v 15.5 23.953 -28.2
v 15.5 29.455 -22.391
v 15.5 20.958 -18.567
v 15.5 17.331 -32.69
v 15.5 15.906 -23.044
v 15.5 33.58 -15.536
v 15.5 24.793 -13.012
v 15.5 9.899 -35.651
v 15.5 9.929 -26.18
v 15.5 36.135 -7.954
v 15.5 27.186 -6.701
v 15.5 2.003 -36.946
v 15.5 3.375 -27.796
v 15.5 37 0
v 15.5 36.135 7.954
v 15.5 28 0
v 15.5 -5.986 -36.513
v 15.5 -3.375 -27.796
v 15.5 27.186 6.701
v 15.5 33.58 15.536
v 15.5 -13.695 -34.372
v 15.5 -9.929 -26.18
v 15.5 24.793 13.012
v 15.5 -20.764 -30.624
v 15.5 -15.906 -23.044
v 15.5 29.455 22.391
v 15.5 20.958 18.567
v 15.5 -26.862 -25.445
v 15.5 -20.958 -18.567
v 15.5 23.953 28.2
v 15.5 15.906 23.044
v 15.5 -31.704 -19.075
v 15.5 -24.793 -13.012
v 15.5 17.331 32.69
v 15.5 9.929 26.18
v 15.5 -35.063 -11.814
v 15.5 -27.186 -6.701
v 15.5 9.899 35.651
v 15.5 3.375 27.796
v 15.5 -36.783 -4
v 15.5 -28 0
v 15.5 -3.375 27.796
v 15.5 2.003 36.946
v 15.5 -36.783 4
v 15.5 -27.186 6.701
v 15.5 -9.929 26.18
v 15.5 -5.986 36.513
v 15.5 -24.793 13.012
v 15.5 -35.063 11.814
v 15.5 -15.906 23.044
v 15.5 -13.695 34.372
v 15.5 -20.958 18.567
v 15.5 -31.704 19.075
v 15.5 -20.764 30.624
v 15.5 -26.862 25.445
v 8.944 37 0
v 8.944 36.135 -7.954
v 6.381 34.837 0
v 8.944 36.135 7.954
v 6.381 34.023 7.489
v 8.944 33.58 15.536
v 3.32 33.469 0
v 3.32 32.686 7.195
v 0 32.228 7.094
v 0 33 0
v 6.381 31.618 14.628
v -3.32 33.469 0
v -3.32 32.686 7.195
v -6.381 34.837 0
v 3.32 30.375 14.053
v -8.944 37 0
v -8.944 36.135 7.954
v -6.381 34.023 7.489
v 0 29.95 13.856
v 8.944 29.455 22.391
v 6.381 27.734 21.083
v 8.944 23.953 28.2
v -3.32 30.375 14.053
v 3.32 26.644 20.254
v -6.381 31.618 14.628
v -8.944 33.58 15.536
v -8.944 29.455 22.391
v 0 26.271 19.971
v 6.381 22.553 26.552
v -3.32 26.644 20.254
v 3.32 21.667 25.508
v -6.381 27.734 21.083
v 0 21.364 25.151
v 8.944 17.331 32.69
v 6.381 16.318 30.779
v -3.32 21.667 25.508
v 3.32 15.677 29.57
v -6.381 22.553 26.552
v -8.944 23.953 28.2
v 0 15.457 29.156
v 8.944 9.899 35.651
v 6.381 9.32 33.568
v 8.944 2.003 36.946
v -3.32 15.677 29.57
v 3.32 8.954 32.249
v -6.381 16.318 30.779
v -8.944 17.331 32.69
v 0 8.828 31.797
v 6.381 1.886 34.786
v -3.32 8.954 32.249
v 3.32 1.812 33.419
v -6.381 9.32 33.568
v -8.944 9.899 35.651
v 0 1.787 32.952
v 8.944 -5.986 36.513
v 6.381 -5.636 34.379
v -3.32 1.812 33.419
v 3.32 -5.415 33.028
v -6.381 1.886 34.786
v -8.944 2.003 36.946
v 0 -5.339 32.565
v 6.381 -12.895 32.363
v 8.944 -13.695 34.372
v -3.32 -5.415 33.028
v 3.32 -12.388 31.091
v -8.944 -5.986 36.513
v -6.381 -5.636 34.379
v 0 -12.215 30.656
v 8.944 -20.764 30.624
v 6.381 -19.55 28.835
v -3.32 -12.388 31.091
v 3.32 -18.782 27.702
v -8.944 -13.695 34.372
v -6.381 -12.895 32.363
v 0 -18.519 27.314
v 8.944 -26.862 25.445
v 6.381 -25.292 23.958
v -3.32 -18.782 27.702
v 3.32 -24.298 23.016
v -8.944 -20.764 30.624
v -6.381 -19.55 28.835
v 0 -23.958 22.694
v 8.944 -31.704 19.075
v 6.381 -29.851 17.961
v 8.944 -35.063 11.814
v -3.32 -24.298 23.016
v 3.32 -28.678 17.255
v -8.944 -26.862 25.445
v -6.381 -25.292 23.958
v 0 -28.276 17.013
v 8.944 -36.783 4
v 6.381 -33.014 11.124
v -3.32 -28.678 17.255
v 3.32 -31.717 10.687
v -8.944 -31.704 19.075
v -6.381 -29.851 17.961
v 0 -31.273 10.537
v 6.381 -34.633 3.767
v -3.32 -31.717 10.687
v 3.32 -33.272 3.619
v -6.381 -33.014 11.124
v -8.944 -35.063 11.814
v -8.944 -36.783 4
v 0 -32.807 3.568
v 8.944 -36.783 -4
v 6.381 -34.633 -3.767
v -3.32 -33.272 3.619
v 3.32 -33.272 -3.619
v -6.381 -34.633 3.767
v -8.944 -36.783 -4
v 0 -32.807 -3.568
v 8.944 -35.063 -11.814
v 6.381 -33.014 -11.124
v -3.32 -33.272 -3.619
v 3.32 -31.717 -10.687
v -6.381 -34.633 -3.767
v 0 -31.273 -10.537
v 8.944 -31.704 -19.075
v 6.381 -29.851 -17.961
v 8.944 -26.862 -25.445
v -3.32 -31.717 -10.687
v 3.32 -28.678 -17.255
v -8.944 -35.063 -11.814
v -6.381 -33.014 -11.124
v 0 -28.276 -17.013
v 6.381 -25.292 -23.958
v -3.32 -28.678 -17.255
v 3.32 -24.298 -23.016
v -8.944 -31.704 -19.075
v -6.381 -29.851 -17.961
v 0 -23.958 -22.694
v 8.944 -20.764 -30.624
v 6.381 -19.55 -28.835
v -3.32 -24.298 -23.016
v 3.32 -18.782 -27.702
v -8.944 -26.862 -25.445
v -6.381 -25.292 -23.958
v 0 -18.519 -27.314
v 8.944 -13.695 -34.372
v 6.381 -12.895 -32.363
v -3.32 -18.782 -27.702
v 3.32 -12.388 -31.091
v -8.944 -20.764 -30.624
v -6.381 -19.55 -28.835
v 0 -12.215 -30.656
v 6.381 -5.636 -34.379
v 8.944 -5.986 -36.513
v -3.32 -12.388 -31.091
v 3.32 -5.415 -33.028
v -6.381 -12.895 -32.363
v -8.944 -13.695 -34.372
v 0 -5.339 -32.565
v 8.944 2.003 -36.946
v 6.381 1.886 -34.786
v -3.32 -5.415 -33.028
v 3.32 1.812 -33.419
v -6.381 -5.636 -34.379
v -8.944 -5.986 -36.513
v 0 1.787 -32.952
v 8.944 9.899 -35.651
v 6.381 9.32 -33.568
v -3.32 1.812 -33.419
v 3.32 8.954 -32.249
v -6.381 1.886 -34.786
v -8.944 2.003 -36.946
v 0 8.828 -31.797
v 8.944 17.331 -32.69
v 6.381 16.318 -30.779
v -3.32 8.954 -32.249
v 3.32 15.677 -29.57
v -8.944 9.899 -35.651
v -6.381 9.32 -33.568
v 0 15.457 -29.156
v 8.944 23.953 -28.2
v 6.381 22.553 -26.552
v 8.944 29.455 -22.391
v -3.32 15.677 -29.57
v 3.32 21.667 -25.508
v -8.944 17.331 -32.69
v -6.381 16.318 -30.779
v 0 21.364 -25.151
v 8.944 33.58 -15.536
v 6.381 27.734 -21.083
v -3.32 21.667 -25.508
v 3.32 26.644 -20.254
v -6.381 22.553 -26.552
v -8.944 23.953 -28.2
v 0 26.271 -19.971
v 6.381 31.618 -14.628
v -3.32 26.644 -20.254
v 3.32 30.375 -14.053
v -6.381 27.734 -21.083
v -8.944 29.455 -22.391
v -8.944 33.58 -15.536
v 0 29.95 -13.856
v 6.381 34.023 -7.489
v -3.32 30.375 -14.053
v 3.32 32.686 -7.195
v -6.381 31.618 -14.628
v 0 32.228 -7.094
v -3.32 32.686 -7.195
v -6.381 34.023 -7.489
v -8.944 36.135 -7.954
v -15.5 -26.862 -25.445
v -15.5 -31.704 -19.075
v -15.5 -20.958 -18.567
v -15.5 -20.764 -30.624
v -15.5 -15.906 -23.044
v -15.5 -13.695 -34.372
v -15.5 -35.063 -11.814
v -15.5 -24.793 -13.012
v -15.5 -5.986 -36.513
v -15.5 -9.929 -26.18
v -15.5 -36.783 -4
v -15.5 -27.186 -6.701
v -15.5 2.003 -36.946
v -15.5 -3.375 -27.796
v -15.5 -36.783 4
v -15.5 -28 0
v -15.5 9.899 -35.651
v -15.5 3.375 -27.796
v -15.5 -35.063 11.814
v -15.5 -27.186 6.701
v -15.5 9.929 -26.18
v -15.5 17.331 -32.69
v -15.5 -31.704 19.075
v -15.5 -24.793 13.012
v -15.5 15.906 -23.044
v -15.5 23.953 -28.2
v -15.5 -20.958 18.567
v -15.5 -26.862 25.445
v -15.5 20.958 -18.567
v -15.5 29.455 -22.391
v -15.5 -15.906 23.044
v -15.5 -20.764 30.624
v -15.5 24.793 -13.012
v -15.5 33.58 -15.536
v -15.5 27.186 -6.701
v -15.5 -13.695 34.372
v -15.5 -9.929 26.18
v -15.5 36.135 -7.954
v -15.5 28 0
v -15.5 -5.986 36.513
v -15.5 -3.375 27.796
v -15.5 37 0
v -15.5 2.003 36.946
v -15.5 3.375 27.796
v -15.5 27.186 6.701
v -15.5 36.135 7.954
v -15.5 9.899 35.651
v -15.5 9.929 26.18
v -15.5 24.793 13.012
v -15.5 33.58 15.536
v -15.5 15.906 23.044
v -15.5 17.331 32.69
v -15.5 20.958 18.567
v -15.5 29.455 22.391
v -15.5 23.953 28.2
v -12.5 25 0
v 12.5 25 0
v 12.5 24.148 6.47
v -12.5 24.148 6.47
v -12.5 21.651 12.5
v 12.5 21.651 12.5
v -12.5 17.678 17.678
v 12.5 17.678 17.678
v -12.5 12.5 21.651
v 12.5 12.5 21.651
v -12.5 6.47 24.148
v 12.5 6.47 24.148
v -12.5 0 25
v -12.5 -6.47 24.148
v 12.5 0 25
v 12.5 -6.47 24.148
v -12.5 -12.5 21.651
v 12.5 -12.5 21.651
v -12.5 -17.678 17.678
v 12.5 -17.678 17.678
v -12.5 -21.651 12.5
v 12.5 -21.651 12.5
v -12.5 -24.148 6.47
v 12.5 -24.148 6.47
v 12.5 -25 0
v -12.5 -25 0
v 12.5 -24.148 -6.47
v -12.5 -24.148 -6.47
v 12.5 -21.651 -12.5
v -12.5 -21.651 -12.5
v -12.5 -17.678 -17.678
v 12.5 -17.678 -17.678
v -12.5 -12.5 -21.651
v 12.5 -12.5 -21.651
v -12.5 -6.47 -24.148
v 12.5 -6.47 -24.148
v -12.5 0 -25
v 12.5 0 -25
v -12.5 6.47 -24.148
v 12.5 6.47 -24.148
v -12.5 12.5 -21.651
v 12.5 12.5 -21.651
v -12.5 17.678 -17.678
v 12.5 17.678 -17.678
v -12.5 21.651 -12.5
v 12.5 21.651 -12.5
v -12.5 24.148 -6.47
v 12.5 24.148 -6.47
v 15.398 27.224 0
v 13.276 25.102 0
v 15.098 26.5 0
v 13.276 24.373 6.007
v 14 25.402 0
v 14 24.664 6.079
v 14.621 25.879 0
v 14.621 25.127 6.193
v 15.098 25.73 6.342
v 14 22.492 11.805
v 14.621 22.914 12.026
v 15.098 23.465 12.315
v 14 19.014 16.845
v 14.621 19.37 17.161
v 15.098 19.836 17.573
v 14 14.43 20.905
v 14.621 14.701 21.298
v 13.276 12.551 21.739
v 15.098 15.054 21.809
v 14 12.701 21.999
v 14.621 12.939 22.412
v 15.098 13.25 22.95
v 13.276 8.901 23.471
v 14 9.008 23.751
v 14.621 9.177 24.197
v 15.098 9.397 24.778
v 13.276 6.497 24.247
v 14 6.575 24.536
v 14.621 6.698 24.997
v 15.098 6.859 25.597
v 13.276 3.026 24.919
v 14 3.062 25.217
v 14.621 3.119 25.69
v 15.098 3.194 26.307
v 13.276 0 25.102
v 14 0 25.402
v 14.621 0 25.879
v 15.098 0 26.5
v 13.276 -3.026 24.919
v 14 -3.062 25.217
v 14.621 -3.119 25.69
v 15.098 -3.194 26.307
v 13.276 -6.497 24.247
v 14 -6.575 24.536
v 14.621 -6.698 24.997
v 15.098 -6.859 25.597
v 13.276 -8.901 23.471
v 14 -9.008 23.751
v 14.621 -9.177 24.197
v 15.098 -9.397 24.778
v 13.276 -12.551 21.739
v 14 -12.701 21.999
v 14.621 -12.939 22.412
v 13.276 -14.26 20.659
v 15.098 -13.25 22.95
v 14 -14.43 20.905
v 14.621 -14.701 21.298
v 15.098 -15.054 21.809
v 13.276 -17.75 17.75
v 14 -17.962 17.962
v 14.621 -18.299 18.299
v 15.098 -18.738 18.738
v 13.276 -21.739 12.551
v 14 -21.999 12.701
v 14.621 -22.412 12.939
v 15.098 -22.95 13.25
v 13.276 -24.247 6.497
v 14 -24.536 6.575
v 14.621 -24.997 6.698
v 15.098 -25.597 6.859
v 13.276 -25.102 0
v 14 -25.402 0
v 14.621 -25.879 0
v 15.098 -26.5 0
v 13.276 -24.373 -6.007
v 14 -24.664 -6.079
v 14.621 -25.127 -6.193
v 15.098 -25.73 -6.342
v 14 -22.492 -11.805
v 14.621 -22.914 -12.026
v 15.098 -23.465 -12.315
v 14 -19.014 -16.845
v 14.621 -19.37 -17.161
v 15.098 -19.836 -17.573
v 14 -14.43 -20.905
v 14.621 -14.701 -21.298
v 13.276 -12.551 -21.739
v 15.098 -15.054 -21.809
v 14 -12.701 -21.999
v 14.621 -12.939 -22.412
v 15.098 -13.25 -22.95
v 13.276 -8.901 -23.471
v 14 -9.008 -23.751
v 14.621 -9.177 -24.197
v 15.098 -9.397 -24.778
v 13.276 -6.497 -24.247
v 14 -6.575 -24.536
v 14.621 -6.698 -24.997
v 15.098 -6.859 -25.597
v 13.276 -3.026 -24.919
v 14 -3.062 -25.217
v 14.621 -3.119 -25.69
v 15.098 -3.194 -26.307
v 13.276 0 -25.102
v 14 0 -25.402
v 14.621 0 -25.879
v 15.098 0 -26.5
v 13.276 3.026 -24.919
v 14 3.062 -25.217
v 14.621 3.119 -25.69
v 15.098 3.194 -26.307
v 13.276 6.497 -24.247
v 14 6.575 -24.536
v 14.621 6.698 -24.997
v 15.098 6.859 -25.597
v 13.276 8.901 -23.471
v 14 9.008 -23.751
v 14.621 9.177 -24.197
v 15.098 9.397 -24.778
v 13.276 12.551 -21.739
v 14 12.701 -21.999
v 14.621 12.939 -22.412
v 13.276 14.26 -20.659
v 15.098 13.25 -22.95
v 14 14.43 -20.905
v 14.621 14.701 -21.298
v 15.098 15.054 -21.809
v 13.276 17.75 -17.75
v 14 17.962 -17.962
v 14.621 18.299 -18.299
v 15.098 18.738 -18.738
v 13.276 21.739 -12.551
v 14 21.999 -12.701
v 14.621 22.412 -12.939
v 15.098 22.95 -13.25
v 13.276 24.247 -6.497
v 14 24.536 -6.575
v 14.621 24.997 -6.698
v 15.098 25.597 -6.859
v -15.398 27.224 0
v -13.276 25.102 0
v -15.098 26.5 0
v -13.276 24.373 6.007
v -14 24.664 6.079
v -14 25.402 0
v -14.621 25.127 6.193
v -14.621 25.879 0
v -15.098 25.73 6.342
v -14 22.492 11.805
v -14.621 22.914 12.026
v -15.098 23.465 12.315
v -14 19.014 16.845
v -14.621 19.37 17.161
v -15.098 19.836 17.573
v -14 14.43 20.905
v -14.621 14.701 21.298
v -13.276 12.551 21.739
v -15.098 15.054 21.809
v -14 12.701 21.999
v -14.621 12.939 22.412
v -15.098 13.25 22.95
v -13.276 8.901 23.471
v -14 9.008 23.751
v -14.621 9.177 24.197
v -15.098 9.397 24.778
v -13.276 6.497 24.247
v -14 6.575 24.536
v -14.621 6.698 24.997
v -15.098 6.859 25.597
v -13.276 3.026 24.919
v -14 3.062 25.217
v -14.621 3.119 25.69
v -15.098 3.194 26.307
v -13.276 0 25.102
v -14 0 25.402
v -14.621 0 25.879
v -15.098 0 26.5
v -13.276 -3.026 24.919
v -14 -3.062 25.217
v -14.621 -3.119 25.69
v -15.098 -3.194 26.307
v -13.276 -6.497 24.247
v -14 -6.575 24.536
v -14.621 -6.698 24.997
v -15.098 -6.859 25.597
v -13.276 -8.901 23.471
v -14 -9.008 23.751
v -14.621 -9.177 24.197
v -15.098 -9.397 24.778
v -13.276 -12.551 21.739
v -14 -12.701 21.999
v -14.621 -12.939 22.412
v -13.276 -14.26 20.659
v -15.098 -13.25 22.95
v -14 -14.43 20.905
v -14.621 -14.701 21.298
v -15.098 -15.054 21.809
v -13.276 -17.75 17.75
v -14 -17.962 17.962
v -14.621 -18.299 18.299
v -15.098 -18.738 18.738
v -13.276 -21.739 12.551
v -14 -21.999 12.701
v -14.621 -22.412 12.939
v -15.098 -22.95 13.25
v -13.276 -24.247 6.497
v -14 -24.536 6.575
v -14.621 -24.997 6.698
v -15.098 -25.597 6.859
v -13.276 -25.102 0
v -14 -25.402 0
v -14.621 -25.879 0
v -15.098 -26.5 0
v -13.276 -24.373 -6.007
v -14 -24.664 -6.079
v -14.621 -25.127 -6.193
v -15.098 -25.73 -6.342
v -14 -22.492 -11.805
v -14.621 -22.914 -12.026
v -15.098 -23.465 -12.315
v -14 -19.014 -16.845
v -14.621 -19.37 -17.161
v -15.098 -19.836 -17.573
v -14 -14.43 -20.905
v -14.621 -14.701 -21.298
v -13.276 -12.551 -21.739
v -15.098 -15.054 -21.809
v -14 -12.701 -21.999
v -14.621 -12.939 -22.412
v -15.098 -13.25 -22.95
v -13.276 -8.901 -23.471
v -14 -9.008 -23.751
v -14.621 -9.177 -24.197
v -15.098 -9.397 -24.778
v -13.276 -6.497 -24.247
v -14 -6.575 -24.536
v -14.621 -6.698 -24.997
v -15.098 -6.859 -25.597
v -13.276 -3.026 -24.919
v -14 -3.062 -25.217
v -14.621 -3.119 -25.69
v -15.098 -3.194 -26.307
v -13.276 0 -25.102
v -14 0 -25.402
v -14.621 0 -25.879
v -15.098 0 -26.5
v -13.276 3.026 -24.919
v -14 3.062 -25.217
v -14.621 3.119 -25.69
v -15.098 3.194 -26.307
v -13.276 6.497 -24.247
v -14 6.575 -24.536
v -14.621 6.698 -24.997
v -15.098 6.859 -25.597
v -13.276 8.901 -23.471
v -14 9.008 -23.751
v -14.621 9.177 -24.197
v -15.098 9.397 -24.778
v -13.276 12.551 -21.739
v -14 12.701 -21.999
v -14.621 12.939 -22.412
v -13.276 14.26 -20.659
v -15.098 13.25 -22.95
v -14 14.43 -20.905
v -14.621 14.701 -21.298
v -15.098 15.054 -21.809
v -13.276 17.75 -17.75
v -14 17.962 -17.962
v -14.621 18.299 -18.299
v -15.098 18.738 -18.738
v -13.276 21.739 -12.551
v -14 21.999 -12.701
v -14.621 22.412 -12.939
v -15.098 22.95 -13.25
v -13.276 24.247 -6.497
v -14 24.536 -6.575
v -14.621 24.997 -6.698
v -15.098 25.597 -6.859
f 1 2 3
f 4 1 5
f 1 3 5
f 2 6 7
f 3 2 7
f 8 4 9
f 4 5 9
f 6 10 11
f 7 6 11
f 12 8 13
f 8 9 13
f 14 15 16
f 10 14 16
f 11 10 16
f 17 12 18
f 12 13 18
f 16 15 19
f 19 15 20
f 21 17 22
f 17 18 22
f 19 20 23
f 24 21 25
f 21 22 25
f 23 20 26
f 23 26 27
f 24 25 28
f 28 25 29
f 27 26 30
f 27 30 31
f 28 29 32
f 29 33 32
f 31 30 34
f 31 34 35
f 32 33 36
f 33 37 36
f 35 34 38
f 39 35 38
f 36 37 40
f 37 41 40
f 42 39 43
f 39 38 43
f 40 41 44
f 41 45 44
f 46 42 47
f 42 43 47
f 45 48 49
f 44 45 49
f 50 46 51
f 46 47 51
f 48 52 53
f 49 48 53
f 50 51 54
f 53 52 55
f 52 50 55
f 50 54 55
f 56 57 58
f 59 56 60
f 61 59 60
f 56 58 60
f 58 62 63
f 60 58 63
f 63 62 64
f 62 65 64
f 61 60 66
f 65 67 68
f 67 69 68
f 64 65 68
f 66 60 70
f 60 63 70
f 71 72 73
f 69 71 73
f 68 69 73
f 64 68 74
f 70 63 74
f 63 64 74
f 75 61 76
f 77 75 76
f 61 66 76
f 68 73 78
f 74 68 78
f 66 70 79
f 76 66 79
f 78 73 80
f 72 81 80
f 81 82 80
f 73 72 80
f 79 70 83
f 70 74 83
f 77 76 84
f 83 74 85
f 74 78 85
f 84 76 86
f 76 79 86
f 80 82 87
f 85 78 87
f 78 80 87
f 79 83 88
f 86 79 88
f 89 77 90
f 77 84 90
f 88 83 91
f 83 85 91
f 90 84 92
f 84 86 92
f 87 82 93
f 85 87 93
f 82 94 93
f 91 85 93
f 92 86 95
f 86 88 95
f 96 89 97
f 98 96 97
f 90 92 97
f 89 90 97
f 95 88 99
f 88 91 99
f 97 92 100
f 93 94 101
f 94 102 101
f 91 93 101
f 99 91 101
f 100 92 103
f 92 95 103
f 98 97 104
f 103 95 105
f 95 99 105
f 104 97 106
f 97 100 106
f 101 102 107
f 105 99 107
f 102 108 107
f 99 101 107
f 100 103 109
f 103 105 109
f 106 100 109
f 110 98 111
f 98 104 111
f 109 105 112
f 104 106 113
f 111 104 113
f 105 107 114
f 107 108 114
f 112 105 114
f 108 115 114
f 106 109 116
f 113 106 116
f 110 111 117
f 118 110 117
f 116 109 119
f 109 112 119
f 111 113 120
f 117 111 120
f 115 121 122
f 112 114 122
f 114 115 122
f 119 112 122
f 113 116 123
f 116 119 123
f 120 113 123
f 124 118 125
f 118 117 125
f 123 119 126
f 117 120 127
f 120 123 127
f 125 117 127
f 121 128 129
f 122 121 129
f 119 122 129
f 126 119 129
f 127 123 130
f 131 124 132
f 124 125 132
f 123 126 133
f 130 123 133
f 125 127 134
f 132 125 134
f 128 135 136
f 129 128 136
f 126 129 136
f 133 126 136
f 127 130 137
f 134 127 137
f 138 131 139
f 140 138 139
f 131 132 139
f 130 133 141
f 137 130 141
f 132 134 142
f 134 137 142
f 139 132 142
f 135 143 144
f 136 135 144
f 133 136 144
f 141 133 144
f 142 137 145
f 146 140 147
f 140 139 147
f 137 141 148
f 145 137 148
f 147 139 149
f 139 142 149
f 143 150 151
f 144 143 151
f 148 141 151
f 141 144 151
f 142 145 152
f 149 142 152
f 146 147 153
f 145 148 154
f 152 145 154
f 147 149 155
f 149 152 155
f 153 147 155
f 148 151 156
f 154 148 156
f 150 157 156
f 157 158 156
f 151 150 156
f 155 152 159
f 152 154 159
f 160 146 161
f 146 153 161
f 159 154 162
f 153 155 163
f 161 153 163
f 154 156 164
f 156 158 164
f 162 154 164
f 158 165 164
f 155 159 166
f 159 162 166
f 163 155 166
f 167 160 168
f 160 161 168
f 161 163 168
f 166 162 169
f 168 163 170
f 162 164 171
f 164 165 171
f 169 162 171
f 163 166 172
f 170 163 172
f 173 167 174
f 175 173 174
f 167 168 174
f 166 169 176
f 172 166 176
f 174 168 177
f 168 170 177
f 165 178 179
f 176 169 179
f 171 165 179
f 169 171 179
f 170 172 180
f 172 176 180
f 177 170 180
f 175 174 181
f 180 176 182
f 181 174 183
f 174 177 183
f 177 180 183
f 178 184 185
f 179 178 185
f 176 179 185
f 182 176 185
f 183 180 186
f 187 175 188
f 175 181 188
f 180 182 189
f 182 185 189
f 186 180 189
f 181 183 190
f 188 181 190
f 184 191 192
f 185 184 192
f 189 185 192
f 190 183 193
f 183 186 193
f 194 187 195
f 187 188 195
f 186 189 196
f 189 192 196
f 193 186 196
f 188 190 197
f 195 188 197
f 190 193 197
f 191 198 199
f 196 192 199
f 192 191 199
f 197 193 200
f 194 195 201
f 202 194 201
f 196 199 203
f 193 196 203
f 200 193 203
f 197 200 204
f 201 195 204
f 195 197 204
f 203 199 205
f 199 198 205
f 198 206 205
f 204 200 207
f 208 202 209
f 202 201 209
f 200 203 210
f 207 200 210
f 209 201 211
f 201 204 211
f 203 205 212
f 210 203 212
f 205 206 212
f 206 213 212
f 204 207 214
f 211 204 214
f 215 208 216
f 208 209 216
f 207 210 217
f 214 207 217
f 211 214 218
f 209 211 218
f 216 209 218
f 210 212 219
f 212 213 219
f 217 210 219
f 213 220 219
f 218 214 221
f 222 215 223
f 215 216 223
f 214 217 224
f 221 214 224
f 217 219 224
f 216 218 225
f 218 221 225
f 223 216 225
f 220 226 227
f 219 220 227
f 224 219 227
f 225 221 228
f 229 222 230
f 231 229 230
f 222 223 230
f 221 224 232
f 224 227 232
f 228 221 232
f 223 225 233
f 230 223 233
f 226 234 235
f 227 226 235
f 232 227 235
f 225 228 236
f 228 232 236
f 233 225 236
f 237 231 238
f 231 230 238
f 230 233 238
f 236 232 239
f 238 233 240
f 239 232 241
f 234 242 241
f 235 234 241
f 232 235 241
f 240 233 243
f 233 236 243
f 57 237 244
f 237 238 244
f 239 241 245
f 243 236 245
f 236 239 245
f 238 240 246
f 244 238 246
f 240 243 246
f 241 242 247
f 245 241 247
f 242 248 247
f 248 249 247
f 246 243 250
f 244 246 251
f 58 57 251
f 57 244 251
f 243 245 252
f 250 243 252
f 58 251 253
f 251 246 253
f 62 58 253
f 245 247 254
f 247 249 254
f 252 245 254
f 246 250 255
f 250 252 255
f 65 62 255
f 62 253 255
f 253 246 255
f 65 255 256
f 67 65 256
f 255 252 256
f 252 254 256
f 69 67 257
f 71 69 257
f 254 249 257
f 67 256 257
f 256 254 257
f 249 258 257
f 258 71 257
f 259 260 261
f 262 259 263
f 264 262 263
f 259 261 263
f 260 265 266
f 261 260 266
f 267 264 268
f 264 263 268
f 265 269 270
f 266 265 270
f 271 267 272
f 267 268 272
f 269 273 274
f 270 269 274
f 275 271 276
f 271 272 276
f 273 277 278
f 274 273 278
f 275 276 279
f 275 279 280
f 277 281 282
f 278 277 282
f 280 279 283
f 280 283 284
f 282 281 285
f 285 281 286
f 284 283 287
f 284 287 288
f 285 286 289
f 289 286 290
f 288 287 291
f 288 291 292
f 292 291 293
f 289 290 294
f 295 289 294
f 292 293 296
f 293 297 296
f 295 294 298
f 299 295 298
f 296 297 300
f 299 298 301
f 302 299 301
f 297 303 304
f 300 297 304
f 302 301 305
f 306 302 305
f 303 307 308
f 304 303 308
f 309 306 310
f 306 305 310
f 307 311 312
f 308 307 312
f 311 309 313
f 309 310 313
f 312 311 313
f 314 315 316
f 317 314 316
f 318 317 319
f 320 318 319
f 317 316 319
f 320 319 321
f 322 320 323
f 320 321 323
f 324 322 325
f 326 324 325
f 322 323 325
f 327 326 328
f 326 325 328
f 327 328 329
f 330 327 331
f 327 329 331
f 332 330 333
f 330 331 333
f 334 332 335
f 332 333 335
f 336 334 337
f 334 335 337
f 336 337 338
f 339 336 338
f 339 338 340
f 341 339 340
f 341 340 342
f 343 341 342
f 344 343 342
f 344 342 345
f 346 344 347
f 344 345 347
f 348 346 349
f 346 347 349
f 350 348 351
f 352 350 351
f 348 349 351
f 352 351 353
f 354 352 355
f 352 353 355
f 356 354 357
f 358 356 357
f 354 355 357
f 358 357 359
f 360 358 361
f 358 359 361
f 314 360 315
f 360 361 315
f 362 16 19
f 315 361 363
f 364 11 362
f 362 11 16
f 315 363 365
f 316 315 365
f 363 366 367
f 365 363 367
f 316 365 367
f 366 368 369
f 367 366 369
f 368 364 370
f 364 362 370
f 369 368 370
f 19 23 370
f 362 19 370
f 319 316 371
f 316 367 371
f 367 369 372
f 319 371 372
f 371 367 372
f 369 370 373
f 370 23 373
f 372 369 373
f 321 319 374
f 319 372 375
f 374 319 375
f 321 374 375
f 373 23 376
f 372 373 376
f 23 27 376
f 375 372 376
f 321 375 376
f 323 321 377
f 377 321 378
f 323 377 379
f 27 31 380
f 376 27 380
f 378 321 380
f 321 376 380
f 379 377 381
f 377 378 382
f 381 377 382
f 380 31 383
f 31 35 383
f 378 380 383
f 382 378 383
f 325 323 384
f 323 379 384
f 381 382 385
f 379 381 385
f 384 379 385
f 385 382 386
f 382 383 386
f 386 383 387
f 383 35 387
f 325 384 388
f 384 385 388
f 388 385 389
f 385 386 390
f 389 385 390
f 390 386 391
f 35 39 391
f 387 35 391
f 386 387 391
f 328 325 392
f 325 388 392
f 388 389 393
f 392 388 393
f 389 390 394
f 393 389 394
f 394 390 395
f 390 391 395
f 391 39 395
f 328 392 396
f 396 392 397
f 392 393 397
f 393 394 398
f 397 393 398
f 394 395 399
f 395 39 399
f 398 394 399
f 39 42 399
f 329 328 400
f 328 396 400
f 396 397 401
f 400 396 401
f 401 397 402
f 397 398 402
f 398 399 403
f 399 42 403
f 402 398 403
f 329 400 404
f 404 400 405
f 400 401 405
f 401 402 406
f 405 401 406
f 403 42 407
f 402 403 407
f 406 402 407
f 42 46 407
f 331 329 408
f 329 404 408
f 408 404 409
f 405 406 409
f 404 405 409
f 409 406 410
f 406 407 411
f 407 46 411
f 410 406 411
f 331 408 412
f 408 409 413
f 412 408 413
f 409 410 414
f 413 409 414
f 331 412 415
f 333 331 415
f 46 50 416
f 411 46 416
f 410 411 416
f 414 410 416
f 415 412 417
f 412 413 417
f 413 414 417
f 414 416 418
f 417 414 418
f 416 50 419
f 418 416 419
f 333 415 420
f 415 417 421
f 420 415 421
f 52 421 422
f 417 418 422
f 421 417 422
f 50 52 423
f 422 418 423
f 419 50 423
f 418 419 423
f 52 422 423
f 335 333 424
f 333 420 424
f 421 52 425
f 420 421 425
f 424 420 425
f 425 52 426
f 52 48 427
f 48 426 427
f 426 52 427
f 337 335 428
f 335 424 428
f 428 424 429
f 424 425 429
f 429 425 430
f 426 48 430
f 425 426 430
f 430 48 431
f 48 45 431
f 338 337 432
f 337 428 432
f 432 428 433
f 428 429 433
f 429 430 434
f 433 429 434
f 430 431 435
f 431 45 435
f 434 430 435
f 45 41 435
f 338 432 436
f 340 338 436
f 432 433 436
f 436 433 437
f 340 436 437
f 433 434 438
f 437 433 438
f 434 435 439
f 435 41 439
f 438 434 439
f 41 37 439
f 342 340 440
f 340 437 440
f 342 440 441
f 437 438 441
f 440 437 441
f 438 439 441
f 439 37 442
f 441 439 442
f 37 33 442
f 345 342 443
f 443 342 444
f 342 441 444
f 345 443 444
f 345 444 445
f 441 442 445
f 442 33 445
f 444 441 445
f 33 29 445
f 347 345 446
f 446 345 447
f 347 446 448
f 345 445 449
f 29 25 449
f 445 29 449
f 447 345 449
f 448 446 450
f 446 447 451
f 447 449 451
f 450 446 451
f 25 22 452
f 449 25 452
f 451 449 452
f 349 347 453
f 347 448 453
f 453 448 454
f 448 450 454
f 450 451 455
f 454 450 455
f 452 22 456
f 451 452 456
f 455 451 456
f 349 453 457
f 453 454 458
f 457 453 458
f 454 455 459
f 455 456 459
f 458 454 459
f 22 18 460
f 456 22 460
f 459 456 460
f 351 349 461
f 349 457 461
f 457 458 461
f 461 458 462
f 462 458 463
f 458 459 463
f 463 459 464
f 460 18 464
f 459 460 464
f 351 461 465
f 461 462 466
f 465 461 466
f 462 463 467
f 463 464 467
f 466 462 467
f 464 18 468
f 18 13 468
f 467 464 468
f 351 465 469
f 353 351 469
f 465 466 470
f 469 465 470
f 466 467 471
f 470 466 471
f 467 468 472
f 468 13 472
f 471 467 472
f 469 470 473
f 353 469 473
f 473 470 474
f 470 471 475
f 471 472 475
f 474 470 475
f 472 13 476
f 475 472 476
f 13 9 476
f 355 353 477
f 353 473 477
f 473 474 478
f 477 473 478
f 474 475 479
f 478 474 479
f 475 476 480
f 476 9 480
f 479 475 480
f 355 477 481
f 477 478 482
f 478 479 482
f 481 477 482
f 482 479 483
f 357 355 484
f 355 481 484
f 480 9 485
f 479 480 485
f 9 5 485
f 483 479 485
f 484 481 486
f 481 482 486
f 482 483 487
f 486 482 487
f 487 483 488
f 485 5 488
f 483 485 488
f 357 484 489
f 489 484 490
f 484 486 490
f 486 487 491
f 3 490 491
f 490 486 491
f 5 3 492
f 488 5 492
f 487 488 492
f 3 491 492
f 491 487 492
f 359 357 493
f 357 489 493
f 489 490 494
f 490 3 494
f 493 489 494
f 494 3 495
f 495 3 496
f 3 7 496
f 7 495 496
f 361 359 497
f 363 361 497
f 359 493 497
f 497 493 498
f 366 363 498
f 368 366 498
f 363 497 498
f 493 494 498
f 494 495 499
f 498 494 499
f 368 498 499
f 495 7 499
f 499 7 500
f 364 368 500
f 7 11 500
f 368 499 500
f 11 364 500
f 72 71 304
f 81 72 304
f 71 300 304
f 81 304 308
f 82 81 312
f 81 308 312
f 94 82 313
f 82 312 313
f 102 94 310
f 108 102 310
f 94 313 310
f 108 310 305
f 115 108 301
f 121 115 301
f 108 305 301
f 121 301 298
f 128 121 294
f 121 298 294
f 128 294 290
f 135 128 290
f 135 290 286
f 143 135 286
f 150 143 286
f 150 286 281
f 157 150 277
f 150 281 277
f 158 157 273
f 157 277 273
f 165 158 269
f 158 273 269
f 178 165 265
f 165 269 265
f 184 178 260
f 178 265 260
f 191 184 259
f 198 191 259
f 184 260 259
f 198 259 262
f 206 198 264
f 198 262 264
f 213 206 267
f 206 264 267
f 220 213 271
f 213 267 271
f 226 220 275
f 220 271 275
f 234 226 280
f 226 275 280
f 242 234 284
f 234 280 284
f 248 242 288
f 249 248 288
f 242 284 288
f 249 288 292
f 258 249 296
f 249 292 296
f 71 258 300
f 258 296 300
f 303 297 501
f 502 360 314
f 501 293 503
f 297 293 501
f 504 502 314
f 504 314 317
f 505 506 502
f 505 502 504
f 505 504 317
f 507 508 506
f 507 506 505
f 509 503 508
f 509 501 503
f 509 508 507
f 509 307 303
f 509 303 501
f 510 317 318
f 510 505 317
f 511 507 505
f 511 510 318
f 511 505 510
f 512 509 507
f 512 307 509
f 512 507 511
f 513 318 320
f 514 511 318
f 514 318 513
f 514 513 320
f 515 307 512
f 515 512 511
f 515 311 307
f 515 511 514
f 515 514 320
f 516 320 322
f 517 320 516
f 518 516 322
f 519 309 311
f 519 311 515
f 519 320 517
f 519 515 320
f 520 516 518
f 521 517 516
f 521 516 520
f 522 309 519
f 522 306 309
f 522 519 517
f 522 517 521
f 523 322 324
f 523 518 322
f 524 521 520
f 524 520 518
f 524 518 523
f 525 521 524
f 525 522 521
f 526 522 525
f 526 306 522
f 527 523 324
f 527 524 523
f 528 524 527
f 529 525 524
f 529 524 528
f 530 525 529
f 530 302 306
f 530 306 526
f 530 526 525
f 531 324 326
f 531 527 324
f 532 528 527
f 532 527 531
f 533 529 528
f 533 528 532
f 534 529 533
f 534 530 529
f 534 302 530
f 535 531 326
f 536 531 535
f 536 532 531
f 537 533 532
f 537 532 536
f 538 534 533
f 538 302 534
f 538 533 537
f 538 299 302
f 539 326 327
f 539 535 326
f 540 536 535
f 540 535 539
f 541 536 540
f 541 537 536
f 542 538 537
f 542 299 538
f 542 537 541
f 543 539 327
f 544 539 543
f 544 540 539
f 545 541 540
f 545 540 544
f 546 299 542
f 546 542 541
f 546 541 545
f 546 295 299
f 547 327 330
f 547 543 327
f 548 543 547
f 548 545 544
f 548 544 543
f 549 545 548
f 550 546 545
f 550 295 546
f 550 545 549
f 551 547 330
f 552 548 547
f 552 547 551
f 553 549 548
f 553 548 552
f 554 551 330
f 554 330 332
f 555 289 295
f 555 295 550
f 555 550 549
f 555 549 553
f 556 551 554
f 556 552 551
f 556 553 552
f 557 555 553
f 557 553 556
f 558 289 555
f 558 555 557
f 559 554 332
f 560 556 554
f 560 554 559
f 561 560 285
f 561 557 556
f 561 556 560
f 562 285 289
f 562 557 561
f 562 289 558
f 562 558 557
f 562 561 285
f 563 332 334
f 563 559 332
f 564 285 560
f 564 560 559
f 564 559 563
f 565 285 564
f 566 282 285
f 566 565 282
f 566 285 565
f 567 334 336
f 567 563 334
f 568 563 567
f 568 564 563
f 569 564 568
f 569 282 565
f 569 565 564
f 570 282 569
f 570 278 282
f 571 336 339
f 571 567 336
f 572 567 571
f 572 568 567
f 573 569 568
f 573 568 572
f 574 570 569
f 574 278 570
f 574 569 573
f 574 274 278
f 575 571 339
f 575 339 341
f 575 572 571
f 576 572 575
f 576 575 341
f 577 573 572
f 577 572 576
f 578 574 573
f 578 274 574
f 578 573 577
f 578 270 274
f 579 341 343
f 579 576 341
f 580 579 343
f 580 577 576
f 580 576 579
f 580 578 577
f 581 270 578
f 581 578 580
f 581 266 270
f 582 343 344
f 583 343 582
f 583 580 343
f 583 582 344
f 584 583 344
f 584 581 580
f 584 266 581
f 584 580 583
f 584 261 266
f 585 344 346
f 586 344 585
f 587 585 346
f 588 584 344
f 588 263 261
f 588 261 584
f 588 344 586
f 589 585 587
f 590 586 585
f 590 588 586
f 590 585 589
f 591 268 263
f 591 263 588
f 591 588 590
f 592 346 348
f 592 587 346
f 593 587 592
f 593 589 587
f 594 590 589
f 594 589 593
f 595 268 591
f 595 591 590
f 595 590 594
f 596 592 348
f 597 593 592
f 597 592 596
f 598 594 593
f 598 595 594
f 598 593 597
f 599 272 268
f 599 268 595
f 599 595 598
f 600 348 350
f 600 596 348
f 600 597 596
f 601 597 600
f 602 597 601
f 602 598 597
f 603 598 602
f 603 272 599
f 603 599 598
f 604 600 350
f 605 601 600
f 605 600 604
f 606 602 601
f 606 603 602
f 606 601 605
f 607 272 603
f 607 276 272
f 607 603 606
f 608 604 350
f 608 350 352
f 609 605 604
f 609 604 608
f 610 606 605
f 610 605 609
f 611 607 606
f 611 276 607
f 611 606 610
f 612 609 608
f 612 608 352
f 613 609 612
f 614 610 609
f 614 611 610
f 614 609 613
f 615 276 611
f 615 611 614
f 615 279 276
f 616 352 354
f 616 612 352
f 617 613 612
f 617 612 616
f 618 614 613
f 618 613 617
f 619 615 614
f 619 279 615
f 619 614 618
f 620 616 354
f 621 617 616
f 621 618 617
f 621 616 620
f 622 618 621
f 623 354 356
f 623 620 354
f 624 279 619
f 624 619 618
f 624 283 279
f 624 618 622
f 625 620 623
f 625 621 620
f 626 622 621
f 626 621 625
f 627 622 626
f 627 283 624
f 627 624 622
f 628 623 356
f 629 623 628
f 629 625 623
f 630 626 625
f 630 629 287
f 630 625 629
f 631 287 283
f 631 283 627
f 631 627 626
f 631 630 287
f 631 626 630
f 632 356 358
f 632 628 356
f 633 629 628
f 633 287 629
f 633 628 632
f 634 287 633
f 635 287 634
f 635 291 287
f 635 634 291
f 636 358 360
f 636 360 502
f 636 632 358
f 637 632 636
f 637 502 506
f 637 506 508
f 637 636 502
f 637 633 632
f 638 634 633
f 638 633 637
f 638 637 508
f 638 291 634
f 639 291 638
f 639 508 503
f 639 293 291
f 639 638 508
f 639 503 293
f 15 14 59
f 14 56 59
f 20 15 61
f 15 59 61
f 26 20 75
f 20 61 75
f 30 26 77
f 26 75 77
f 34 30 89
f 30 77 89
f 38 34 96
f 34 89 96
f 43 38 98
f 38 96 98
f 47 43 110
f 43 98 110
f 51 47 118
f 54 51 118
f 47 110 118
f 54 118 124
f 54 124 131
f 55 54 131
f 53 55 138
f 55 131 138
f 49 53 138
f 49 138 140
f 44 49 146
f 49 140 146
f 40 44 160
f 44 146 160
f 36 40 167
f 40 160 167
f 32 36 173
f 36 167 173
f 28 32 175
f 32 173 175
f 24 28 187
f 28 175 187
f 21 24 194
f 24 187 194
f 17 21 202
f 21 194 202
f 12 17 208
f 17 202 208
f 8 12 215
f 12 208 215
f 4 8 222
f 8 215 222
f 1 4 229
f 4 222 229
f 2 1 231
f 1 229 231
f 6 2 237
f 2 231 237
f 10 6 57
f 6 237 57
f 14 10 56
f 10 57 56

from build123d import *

# Parameters (mm, degrees)
FILLET1_R = 3


with BuildPart() as part:
    # Sketch1 → Revolve1 (revolve)
    with BuildSketch(Plane.XY):
        with BuildLine():
            Line((-15.5, 25), (15.5, 25))
            Line((15.5, 25), (15.5, 37))
            Line((15.5, 37), (8.94427191, 37))
            ThreePointArc((8.94427191, 37), (0, 33), (-8.94427191, 37))
            Line((-8.94427191, 37), (-15.5, 37))
            Line((-15.5, 37), (-15.5, 25))
        make_face()
    revolve(axis=Axis((-22.616352201, 0, 0), (1, 0, 0)))

    # Fillet1
    fillet1_edges = [part.edges().sort_by_distance(p)[0] for p in [
        (15.5, -25, 0),
        (-15.5, -25, 0),
    ]]
    fillet(fillet1_edges, radius=FILLET1_R)


solid = part.part
